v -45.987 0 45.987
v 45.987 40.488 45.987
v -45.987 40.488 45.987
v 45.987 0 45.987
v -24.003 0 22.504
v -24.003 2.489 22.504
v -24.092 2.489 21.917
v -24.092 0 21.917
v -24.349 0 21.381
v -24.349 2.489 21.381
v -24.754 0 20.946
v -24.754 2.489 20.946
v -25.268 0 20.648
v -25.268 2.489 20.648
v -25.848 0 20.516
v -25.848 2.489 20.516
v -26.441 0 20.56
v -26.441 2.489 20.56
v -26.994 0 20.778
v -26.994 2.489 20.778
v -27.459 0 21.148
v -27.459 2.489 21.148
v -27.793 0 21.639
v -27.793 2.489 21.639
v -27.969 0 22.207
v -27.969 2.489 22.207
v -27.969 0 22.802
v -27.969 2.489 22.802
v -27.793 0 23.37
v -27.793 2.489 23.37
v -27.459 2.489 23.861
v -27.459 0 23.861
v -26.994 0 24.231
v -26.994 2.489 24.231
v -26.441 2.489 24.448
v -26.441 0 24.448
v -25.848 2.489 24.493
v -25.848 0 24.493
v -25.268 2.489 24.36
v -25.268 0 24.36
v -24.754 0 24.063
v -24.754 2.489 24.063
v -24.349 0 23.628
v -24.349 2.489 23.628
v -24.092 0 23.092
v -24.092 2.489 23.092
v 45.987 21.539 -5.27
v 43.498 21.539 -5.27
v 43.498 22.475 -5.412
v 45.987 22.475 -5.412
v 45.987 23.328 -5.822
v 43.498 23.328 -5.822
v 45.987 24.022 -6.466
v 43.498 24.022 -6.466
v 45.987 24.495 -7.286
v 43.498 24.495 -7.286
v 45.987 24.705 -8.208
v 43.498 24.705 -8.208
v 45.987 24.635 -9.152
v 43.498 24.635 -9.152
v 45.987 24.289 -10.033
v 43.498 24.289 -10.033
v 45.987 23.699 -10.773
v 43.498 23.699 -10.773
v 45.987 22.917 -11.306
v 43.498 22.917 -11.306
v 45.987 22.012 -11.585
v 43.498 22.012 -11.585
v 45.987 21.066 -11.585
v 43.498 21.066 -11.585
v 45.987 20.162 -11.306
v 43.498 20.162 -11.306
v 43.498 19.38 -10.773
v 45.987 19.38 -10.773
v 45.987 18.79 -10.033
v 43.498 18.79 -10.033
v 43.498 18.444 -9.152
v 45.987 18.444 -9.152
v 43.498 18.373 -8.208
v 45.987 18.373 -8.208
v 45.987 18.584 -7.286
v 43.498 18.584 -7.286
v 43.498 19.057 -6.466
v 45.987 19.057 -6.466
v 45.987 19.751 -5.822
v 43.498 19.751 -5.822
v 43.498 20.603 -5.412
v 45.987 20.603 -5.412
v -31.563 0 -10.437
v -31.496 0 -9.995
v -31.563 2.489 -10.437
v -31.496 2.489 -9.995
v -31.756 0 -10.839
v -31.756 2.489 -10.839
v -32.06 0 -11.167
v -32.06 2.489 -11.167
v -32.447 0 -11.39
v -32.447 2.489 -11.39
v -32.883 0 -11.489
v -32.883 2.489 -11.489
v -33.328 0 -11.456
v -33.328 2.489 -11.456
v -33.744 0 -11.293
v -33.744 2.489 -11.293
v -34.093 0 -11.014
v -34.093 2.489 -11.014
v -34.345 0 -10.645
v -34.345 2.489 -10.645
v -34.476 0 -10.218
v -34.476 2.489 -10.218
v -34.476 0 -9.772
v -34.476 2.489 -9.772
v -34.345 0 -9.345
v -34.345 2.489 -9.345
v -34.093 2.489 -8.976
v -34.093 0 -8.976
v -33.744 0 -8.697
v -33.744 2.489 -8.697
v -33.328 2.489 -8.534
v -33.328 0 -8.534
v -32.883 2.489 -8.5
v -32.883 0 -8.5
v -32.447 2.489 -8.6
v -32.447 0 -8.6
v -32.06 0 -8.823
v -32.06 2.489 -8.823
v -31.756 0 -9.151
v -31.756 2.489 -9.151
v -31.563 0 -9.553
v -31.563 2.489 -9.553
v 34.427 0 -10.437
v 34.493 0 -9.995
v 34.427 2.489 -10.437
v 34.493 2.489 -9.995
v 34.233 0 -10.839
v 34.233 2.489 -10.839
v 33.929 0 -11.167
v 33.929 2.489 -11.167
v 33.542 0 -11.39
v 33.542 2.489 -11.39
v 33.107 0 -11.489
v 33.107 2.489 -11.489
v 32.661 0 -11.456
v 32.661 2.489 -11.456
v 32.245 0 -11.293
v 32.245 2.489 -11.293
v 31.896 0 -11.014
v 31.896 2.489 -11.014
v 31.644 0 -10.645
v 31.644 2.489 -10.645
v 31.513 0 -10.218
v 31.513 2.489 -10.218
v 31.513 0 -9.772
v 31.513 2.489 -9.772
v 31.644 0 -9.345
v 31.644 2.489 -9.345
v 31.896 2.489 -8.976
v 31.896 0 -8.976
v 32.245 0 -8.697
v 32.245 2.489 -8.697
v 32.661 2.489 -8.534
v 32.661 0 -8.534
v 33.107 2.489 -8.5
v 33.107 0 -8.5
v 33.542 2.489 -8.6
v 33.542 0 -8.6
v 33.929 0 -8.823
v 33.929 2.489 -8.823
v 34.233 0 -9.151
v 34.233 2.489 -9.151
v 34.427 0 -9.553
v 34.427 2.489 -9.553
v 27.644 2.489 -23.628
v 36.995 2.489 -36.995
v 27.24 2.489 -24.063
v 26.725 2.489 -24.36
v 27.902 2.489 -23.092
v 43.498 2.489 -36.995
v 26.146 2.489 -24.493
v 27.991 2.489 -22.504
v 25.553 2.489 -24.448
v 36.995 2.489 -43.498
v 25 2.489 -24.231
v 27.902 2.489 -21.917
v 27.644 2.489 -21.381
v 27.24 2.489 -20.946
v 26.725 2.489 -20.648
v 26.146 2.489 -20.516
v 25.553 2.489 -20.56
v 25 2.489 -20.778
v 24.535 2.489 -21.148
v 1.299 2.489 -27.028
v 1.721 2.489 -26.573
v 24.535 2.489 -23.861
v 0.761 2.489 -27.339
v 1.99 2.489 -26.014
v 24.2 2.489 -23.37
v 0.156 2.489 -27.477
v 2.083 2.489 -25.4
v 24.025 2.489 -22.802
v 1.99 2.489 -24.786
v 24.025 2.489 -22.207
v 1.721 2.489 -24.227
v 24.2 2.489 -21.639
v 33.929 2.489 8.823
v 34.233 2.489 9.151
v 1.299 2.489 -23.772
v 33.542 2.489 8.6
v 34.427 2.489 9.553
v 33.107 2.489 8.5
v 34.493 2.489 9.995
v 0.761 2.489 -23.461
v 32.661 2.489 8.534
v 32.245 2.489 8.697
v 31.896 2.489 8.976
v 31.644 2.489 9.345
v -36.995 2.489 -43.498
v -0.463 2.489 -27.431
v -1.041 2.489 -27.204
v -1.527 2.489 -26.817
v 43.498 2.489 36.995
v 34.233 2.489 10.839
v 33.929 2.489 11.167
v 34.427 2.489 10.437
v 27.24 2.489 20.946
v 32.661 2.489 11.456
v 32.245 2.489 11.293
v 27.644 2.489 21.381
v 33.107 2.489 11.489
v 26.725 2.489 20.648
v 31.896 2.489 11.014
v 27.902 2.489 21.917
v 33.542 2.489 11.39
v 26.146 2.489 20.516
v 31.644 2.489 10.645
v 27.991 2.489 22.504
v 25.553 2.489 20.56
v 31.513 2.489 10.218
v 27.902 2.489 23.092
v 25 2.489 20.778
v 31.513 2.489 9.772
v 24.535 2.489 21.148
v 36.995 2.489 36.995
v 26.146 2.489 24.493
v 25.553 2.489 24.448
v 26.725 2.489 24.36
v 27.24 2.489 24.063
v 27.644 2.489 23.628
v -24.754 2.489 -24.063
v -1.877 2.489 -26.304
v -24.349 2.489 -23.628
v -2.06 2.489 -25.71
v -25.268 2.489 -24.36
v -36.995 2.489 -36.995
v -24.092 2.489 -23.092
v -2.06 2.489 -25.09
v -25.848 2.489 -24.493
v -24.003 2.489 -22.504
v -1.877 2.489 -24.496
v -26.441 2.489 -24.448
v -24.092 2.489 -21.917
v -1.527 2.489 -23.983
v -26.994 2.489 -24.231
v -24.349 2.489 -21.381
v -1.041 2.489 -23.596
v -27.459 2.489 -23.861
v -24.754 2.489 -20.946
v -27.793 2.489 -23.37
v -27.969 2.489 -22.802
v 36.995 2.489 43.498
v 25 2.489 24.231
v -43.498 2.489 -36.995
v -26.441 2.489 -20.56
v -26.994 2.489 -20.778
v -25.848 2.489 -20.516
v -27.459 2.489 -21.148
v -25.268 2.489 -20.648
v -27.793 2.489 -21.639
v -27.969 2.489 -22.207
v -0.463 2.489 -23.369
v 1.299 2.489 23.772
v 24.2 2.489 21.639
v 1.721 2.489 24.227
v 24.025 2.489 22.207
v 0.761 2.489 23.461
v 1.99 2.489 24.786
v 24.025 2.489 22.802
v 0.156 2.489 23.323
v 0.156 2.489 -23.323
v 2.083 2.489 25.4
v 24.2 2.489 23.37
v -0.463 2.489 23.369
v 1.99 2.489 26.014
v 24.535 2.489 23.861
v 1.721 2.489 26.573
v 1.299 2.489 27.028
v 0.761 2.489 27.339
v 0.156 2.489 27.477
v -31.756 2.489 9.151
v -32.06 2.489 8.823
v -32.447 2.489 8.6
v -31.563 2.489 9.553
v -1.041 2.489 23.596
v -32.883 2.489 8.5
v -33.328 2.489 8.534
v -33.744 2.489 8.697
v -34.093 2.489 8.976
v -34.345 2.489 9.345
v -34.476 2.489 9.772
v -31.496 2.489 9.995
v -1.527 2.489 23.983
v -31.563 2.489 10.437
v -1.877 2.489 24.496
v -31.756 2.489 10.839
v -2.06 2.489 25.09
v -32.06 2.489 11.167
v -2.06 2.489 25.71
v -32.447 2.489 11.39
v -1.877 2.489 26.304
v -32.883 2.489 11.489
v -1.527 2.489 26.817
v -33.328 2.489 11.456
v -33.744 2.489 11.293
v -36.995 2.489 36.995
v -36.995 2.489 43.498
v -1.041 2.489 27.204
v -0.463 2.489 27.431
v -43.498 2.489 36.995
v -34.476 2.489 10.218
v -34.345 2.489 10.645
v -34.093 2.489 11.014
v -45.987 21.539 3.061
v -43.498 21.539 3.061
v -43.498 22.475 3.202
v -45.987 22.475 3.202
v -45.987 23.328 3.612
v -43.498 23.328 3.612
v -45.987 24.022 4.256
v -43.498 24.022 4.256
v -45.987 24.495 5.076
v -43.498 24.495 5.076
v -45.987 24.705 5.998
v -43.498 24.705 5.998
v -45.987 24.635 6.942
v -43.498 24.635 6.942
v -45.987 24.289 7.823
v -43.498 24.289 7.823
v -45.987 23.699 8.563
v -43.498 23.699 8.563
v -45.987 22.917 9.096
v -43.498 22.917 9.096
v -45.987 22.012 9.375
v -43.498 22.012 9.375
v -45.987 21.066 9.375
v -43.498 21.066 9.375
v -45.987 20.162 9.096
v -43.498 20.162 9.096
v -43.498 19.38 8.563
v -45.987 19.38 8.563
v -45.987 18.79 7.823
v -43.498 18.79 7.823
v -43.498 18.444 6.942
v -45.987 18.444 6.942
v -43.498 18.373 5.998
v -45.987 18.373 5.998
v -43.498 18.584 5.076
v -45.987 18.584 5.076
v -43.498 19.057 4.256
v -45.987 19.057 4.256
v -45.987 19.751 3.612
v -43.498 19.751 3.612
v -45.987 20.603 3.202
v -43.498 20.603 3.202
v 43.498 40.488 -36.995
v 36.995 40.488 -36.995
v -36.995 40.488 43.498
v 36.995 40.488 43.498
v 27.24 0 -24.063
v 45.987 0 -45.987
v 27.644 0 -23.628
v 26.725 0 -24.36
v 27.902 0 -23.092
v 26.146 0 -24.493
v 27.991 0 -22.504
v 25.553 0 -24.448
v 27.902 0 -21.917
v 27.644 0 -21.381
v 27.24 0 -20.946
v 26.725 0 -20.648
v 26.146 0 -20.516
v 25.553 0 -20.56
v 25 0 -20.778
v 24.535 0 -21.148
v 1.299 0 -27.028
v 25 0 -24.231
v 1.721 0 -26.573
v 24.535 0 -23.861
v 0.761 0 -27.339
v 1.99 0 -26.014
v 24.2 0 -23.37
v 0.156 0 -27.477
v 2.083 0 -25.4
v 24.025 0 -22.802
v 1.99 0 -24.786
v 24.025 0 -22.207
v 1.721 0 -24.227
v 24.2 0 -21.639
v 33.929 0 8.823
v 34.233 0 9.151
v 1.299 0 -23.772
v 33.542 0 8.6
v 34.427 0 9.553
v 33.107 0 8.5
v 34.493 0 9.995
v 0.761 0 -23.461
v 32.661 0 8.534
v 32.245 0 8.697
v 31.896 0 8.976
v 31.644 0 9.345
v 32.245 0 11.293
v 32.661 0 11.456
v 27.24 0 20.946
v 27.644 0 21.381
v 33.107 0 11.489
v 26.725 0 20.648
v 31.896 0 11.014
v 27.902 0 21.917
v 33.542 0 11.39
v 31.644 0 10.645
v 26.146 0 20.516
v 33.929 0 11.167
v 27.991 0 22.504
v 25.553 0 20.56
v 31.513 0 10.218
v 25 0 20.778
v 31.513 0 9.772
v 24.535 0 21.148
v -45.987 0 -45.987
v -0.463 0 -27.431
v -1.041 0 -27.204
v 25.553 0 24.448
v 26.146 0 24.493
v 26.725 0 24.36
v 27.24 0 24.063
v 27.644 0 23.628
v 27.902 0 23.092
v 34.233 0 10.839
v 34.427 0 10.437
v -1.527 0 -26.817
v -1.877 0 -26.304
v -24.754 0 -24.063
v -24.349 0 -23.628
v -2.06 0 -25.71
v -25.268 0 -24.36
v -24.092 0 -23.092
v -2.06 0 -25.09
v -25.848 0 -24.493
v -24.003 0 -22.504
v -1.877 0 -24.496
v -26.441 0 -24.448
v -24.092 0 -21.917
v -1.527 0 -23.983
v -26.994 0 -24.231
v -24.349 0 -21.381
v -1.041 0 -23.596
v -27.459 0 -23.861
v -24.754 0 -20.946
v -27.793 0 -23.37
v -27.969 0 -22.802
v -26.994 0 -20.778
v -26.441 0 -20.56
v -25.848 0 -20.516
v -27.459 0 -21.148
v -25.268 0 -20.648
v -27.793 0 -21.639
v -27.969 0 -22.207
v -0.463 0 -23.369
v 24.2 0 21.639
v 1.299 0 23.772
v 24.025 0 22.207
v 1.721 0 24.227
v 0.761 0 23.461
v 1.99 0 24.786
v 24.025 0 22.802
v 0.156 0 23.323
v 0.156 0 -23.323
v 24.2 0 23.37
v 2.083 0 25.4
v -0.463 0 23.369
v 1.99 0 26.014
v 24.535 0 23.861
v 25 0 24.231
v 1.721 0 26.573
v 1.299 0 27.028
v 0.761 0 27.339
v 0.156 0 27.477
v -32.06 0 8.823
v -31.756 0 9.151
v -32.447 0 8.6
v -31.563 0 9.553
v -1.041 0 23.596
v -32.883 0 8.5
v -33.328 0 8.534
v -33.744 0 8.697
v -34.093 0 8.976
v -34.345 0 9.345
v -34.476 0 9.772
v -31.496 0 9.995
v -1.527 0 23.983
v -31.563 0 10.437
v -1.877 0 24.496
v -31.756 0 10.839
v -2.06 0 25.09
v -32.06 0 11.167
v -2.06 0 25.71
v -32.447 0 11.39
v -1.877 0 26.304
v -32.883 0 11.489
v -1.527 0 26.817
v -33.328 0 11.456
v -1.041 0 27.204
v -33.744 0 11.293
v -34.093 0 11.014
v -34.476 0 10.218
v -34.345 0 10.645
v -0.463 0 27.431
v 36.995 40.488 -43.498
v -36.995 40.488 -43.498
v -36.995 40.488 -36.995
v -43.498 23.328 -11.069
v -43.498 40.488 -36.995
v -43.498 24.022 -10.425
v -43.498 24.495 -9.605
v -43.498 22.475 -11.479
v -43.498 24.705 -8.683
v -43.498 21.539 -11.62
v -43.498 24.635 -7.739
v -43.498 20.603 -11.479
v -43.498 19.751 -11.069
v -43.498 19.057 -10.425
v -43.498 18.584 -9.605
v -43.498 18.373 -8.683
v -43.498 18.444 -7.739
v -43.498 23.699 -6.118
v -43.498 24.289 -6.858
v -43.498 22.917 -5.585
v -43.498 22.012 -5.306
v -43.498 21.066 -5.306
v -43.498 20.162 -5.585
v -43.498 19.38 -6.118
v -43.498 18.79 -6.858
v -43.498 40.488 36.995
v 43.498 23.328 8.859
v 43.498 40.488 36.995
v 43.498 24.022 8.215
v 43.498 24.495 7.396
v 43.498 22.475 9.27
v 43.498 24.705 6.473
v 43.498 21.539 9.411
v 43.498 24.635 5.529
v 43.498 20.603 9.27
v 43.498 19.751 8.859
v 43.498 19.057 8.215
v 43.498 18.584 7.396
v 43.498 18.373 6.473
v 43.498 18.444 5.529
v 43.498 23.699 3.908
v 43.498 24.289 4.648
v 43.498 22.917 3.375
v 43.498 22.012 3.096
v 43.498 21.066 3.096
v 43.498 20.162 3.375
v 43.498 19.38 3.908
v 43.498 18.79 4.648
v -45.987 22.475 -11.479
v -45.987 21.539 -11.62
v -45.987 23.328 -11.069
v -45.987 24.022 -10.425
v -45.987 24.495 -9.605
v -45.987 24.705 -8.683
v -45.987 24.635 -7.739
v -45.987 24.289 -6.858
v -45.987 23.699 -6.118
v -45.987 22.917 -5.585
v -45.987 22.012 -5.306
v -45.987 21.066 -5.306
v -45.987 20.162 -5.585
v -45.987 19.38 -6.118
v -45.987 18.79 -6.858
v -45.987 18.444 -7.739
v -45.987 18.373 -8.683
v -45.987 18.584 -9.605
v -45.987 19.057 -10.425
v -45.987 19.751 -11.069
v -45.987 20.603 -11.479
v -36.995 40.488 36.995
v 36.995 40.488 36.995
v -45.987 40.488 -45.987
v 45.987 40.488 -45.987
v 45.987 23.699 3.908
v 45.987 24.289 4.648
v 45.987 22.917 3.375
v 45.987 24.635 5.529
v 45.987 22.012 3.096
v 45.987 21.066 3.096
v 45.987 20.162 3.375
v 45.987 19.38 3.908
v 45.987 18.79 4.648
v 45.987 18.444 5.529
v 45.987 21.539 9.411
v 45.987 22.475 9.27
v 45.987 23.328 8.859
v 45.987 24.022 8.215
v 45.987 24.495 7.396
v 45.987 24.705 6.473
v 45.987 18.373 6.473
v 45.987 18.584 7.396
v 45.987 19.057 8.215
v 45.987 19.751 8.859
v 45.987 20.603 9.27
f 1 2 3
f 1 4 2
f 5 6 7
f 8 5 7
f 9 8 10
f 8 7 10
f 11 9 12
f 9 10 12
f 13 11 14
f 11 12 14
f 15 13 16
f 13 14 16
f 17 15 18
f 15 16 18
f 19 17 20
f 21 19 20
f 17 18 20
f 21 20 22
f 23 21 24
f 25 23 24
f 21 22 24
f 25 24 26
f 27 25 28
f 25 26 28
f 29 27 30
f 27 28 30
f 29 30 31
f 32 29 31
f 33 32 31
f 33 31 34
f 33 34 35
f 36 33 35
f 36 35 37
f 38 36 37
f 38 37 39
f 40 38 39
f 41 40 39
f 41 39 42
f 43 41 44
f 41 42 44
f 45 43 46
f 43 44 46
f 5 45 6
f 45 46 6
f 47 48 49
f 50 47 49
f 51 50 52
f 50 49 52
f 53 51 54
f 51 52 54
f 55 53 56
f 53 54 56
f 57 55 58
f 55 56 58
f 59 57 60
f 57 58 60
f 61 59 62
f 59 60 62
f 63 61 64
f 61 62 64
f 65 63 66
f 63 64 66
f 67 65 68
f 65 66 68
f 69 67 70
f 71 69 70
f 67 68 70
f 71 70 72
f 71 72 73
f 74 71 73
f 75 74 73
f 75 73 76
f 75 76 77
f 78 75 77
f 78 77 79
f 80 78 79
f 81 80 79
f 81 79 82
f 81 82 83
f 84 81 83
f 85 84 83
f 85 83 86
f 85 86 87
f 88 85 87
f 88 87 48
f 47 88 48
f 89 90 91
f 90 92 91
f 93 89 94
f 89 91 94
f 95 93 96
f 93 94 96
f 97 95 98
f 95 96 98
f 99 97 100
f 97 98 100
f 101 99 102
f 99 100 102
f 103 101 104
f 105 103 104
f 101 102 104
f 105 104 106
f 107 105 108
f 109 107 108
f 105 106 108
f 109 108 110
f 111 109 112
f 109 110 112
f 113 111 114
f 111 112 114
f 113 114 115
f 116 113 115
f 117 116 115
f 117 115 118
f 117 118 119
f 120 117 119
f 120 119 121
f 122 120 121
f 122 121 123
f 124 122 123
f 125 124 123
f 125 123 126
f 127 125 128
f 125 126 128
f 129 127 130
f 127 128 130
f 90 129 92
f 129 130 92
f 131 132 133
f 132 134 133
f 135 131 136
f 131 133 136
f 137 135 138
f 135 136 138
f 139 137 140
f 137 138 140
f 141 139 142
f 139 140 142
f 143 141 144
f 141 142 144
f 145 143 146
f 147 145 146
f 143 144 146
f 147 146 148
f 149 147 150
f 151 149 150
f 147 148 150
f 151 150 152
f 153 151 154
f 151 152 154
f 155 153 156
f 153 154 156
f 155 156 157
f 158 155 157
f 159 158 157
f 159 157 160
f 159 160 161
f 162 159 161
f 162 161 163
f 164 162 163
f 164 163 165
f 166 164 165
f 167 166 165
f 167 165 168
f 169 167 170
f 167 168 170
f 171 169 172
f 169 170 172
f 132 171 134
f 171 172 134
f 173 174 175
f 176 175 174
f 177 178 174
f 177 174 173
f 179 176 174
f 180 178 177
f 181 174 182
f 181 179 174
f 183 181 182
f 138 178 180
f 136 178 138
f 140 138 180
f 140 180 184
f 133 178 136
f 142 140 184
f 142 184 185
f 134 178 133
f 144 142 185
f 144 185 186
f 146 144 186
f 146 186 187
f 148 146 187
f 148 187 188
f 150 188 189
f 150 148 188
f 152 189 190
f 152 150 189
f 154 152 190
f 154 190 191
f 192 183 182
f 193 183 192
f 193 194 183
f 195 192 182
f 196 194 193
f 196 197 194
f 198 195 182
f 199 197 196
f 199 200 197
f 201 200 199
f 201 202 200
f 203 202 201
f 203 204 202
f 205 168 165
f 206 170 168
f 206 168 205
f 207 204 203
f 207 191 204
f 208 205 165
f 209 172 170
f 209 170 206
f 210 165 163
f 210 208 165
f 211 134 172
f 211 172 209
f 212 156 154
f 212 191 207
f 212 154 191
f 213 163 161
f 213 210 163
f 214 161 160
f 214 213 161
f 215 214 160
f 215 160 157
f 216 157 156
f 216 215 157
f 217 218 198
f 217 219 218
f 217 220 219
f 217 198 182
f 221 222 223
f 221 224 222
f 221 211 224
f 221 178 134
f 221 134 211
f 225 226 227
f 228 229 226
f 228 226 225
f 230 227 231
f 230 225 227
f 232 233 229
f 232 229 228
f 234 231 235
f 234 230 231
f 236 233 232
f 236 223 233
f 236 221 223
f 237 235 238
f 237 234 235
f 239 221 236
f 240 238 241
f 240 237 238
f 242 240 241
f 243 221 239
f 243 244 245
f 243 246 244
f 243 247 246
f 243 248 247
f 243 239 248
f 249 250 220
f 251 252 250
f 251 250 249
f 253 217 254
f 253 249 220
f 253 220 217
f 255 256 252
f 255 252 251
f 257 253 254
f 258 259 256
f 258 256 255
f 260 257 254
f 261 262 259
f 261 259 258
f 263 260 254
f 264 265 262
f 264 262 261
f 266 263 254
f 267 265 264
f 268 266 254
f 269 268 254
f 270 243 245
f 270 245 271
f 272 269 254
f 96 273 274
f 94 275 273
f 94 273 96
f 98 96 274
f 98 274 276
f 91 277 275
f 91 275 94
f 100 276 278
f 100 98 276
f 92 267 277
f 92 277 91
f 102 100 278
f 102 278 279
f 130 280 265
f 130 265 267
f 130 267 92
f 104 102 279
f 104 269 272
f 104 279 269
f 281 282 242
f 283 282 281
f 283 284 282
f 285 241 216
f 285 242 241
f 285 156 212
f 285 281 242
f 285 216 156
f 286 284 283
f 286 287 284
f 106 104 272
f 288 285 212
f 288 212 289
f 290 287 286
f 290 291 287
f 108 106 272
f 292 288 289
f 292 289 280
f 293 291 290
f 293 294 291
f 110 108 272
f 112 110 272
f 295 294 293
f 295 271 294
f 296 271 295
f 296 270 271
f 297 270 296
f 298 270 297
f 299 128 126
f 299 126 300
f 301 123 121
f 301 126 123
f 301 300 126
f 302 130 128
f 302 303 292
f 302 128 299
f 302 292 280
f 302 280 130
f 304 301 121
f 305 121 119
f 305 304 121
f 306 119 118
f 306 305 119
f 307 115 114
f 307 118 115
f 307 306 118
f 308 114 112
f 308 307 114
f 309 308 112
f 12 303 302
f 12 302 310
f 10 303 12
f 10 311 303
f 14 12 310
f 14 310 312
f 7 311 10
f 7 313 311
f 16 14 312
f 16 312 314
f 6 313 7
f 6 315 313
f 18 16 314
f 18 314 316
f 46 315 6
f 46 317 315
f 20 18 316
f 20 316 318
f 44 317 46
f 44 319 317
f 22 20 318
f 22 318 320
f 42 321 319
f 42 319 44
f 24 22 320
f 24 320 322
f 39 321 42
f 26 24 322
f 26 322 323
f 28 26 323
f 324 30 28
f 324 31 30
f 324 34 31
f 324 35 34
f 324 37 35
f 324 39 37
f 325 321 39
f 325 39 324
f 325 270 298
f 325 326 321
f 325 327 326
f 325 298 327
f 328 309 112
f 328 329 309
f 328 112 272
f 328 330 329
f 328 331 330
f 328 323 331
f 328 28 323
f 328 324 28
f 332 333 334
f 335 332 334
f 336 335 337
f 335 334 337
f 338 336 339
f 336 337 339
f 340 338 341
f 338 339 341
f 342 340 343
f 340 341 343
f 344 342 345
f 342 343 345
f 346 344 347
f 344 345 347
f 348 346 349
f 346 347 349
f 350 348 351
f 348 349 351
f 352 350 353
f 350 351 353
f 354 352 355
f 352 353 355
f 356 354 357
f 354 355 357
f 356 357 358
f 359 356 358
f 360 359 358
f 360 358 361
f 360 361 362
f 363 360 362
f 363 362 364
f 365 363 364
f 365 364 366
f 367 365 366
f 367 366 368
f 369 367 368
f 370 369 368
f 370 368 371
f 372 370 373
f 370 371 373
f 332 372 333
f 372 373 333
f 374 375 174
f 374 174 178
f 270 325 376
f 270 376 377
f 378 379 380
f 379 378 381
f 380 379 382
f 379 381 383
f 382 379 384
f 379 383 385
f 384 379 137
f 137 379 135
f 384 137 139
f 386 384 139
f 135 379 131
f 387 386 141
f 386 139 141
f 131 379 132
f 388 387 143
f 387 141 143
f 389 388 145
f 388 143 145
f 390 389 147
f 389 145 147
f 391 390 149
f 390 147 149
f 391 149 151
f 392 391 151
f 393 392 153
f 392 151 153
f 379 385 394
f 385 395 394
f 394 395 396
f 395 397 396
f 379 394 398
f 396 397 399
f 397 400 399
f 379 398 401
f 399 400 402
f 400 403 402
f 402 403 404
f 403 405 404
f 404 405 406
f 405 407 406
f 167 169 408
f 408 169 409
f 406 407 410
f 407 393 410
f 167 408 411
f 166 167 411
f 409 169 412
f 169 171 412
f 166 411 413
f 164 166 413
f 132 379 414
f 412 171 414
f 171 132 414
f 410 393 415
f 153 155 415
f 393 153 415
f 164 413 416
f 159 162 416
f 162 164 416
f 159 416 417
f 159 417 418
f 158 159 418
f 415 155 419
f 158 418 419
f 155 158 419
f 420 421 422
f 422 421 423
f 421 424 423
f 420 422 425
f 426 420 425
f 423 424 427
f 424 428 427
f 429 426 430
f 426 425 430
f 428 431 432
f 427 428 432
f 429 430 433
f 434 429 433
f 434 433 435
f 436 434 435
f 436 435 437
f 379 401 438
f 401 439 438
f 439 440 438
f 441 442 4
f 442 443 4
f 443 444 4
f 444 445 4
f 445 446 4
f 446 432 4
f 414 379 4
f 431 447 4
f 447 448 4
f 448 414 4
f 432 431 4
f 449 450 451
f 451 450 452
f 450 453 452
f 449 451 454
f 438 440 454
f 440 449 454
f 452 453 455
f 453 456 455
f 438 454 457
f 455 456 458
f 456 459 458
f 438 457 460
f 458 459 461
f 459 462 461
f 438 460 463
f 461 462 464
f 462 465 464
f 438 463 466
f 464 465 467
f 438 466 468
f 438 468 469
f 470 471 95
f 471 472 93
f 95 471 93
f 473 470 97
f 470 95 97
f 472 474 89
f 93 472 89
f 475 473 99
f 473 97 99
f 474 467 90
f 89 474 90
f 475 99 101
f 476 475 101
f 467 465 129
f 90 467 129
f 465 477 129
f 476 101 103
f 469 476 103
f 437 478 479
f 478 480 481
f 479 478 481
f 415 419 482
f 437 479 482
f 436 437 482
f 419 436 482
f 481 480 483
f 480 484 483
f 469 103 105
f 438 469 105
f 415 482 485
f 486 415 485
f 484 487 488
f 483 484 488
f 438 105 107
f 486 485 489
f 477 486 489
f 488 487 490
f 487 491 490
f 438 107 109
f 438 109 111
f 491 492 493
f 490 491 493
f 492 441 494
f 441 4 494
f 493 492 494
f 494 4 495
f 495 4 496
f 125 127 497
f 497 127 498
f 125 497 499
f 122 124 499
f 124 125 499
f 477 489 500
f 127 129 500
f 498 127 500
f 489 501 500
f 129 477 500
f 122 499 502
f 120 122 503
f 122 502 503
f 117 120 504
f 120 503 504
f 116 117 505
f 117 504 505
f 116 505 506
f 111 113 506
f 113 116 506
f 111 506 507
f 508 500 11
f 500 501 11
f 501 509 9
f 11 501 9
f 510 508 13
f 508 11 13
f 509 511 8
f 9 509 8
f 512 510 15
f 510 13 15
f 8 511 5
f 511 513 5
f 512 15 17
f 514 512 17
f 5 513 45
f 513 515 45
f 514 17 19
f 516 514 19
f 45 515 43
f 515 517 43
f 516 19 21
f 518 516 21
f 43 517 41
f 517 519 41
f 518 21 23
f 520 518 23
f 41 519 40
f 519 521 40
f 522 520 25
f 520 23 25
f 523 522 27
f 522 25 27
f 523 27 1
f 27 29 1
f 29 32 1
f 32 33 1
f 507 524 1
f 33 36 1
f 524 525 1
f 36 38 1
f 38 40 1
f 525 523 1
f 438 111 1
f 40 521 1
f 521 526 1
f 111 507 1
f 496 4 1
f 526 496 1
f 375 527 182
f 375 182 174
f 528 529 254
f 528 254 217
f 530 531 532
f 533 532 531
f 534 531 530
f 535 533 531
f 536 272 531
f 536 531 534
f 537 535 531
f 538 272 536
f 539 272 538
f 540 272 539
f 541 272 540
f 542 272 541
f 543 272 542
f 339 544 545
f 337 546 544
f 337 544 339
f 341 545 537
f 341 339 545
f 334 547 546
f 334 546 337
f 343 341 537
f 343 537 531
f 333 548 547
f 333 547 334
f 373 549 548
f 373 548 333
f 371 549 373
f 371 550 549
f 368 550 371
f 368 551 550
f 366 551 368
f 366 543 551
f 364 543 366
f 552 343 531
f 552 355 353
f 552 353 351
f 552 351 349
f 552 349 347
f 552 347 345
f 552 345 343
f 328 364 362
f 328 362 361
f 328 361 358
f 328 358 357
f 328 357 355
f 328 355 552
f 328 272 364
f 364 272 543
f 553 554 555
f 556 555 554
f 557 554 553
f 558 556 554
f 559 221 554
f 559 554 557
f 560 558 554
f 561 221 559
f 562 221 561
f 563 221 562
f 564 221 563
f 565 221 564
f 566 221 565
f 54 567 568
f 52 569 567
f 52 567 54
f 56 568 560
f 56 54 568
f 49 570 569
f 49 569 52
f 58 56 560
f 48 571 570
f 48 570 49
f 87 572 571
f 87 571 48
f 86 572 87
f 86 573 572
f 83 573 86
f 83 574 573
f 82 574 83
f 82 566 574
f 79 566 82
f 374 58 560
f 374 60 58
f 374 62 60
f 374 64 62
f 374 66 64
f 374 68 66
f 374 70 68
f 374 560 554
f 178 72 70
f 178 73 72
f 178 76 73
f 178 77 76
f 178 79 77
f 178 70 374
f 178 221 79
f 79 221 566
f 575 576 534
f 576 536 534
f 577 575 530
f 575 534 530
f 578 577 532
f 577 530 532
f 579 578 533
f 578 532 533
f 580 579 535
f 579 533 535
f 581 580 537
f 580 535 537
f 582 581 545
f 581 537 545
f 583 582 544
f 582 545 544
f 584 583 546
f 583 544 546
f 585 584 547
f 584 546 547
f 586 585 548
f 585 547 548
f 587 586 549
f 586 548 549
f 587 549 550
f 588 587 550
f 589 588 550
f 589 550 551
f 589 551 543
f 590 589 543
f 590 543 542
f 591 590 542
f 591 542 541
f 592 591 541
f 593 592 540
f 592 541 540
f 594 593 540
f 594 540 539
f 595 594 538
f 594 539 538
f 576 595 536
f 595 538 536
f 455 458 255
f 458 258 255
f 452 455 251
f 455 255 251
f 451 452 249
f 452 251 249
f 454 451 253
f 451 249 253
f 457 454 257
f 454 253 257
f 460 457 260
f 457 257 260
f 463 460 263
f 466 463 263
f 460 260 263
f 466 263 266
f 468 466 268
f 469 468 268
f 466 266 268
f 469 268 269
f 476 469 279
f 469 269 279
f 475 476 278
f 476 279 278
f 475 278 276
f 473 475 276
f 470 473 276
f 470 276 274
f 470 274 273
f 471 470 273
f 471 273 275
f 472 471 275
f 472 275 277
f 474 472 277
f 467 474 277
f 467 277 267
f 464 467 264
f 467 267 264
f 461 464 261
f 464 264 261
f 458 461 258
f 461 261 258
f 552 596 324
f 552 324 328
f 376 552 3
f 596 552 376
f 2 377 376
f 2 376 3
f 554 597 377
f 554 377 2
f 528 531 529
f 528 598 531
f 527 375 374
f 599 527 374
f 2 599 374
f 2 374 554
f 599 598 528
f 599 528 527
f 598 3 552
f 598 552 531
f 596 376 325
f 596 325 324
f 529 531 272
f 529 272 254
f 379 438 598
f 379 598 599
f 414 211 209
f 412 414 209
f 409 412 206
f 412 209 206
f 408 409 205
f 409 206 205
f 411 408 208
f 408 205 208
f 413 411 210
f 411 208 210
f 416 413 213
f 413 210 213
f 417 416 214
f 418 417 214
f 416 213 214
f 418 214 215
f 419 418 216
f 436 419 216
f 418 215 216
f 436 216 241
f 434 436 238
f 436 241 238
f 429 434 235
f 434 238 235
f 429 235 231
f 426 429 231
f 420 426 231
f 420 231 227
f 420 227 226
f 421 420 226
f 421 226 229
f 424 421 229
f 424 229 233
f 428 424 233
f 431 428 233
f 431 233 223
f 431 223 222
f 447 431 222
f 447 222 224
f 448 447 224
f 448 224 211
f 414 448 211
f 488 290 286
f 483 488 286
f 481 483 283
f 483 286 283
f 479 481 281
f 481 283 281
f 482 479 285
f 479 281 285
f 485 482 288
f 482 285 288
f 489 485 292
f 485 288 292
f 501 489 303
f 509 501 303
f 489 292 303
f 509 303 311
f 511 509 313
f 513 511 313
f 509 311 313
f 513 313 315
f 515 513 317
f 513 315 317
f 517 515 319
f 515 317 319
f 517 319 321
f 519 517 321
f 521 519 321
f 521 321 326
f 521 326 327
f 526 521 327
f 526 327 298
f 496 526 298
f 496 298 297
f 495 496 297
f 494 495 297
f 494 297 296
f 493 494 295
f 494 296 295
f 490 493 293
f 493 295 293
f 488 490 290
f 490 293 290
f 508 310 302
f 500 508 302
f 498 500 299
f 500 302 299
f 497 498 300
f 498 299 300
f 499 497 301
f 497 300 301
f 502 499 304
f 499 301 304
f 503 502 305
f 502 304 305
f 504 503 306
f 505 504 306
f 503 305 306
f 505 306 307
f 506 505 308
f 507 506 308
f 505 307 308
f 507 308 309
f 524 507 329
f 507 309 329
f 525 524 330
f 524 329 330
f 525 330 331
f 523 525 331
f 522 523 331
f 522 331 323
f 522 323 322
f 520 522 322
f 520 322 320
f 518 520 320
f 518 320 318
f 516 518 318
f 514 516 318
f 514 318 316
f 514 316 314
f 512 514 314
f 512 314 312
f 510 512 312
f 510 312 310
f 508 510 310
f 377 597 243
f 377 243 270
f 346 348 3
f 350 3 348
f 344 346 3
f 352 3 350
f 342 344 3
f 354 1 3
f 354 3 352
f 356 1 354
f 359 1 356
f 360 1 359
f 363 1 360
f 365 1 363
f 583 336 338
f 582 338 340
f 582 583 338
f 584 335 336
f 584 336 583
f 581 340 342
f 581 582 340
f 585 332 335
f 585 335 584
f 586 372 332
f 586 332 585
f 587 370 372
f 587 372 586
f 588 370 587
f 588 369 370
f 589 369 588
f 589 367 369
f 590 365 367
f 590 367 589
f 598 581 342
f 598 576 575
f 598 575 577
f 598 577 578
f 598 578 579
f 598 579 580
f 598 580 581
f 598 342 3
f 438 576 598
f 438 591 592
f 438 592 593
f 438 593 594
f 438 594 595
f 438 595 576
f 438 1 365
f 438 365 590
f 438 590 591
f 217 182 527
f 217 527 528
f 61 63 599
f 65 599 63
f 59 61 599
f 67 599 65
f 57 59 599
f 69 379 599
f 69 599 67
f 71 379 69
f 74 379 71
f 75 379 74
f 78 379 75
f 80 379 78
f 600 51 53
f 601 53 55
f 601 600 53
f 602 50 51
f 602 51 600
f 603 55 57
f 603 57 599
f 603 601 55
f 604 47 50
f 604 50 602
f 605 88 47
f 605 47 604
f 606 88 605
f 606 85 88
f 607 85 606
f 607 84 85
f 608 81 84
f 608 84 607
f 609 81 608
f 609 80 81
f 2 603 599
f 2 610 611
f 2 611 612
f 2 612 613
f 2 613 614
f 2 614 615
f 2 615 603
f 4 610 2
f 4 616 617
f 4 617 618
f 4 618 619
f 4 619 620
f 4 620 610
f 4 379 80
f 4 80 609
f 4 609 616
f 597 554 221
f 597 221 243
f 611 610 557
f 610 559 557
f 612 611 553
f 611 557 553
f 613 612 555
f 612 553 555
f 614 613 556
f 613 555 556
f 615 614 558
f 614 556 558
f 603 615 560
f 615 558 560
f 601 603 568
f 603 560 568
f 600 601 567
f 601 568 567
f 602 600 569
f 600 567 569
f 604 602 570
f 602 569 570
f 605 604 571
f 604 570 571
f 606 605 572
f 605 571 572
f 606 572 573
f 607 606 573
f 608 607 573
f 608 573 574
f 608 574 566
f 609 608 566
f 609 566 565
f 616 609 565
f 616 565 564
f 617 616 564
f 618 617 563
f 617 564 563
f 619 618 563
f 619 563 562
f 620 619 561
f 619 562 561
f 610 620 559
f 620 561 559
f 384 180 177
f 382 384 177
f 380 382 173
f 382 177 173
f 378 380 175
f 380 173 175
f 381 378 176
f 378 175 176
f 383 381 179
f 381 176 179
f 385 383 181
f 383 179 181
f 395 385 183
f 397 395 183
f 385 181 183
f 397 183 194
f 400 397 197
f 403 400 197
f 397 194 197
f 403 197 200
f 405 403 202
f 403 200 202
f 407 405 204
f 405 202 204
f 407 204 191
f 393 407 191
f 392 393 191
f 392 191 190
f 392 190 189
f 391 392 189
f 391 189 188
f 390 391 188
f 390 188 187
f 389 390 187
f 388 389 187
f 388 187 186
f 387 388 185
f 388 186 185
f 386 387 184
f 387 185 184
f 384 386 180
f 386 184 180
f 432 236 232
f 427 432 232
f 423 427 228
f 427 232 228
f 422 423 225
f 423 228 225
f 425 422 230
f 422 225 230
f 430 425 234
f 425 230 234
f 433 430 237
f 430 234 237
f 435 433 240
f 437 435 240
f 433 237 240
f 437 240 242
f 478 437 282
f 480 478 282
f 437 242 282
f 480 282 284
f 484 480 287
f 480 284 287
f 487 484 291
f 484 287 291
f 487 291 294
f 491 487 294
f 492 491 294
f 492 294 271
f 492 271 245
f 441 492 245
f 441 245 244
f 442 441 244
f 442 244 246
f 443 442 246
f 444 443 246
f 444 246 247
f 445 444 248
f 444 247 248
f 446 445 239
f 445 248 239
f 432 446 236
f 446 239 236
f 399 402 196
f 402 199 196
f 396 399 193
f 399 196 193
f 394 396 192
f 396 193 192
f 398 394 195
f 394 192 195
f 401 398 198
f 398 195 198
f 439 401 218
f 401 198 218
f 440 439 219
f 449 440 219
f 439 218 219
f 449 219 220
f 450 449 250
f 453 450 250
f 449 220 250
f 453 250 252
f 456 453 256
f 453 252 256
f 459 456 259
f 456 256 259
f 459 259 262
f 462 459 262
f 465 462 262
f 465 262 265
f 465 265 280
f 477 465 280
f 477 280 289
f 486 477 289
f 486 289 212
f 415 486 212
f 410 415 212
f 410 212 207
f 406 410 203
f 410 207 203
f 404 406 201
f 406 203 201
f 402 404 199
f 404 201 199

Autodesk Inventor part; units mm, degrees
ref_plane "YZ Plane" through (0, 0, 0) normal (1, 0, 0) x (0, 1, 0)
ref_plane "XZ Plane" through (0, 0, 0) normal (0, 1, 0) x (-1, 0, 0)
ref_plane "XY Plane" through (0, 0, 0) normal (0, 0, 1) x (1, 0, 0)
sketch "Sketch1" plane through (0, 0, 0) normal (0, 1, 0) x (-1, 0, 0)
  line L0 (45.9867, -45.9867) -> (-45.9867, -45.9867)
  line L1 (-45.9867, -45.9867) -> (-45.9867, 45.9867)
  line L2 (-45.9867, 45.9867) -> (45.9867, 45.9867)
  line L3 (45.9867, 45.9867) -> (45.9867, -45.9867)
  line L4 (45.9867, -45.9867) -> (-45.9867, 45.9867) construction
  line L5 (-45.9867, -45.9867) -> (45.9867, 45.9867) construction
  point P0 (0, 0)
  dimension "d0" = 91.9734
  dimension "d1" = 91.9734
extrude "Extrusion1" add sketch "Sketch1" along normal blind 2.4892
sketch "Sketch2" plane through (0, 2.4892, 0) normal (0, 1, 0) x (1, 0, 0)
  line L0 (-45.9867, -45.9867) -> (45.9867, -45.9867) projected
  line L1 (45.9867, 45.9867) -> (-45.9867, 45.9867) projected
  line L2 (-45.9867, -45.9867) -> (45.9867, -45.9867)
  line L3 (45.9867, -45.9867) -> (45.9867, 45.9867)
  line L4 (45.9867, 45.9867) -> (-45.9867, 45.9867)
  line L5 (-45.9867, 45.9867) -> (-45.9867, -45.9867)
  line L6 (43.4975, -43.4975) -> (-43.4975, 43.4975) construction
  line L7 (-43.4975, -43.4975) -> (43.4975, 43.4975) construction
  line L8 (-45.9867, -45.9867) -> (-36.9951, -45.9867)
  line L9 (-45.9867, -36.9951) -> (-45.9867, -45.9867)
  line L10 (-45.9867, 45.9867) -> (-45.9867, -45.9867) projected
  line L11 (-45.9867, 45.9867) -> (-36.9951, 45.9867)
  line L12 (-45.9867, 36.9951) -> (-45.9867, 45.9867)
  line L13 (45.9867, 45.9867) -> (36.9951, 45.9867)
  line L14 (45.9867, 36.9951) -> (45.9867, 45.9867)
  line L15 (45.9867, -45.9867) -> (36.9951, -45.9867)
  line L16 (45.9867, -36.9951) -> (45.9867, -45.9867)
  line L17 (-36.9951, -43.4975) -> (-36.9951, -36.9951)
  line L18 (-36.9951, -36.9951) -> (-43.4975, -36.9951)
  line L19 (-43.4975, 36.9951) -> (-36.9951, 36.9951)
  line L20 (-36.9951, 36.9951) -> (-36.9951, 43.4975)
  line L21 (36.9951, 36.9951) -> (43.4975, 36.9951)
  line L22 (36.9951, 43.4975) -> (36.9951, 36.9951)
  line L23 (43.4975, -36.9951) -> (36.9951, -36.9951)
  line L24 (36.9951, -36.9951) -> (36.9951, -43.4975)
  line L25 (-36.9951, -43.4975) -> (36.9951, -43.4975)
  line L26 (43.4975, -36.9951) -> (43.4975, 36.9951)
  line L27 (36.9951, 43.4975) -> (-36.9951, 43.4975)
  line L28 (-43.4975, 36.9951) -> (-43.4975, -36.9951)
  point P0 (0, 0)
  dimension "d4" = 86.995
  dimension "d5" = 86.995
  dimension "d6" = 8.9916
  dimension "d7" = 8.9916
  dimension "d10" = 8.9916
  dimension "d11" = 8.9916
extrude "Extrusion2" add sketch "Sketch2" along normal blind 37.9984
sketch "Sketch3" plane through (0, 2.4892, 0) normal (0, 1, 0) x (1, 0, 0)
  line L0 (25.9969, -22.5044) -> (-25.9969, 22.5044) construction
  line L1 (-25.9969, -22.5044) -> (25.9969, 22.5044) construction
  circle A0 centre (-25.9969, -22.5044) radius 1.9939
  circle A1 centre (-25.9969, 22.5044) radius 1.9939
  circle A2 centre (25.9969, 22.5044) radius 1.9939
  circle A3 centre (25.9969, -22.5044) radius 1.9939
  line L2 (32.9946, -9.9949) -> (-32.9946, 9.9949) construction
  line L3 (-32.9946, -9.9949) -> (32.9946, 9.9949) construction
  circle A4 centre (-32.9946, -9.9949) radius 1.4986
  circle A5 centre (-32.9946, 9.9949) radius 1.4986
  circle A6 centre (32.9946, -9.9949) radius 1.4986
  circle A7 centre (32.9946, 9.9949) radius 1.4986
  circle A8 centre (0, -25.4) radius 2.0828
  circle A9 centre (0, 25.4) radius 2.0828
  point P0 (0, 0)
  dimension "d16" = 51.9938
  dimension "d17" = 45.0088
  dimension "d18" = 3.9878
  dimension "d19" = 3.9878
  dimension "d20" = 3.9878
  dimension "d21" = 3.9878
  dimension "d22" = 65.9892
  dimension "d23" = 19.9898
  dimension "d24" = 2.9972
  dimension "d25" = 2.9972
  dimension "d26" = 2.9972
  dimension "d27" = 2.9972
  dimension "d30" = 4.1656
  dimension "d31" = 4.1656
extrude "Extrusion3" cut sketch "Sketch3" against normal through all
sketch "Sketch4" plane through (-43.4975, 2.4892, 36.9951) normal (1, 0, 0) x (0, 0, -1)
  line L0 (0, 0) -> (0, 37.9984) projected
  line L1 (0, 19.05) -> (9.4996, 19.05)
  line L2 (0, 19.05) -> (9.4996, 19.05) construction
  line L3 (9.4996, 19.05) -> (30.7594, 19.05)
  line L4 (30.7594, 19.05) -> (45.4406, 19.05)
  circle A0 centre (30.7594, 19.05) radius 3.175
  circle A1 centre (45.4406, 19.05) radius 3.175
  point P0 (36.9951, -2.4892)
  point P1 (73.9902, 0)
  dimension "d44" = 9.4996
  dimension "d45" = 0
  dimension "d46" = 21.2598
  dimension "d47" = 14.6812
  dimension "d48" = 6.35
  dimension "d49" = 6.35
extrude "Extrusion4" cut sketch "Sketch4" against normal through all
sketch "Sketch5" plane through (43.4975, 2.4892, -36.9951) normal (-1, 0, 0) x (0, 0, 1)
  line L0 (73.9902, 0) -> (73.9902, 37.9984) projected
  line L1 (73.9902, 19.05) -> (64.4906, 19.05)
  line L2 (64.4906, 19.05) -> (43.2308, 19.05)
  line L3 (43.2308, 19.05) -> (28.5496, 19.05)
  circle A0 centre (43.2308, 19.05) radius 3.175
  circle A1 centre (28.5496, 19.05) radius 3.175
  point P0 (36.9951, -2.4892)
  point P1 (0, 37.9984)
  dimension "d50" = 9.4996
  dimension "d51" = 21.2598
  dimension "d52" = 14.6812
  dimension "d53" = 6.35
  dimension "d54" = 6.35
extrude "Extrusion5" cut sketch "Sketch5" against normal through all
properties part number "546-1590YFLBK-ADL5534"
